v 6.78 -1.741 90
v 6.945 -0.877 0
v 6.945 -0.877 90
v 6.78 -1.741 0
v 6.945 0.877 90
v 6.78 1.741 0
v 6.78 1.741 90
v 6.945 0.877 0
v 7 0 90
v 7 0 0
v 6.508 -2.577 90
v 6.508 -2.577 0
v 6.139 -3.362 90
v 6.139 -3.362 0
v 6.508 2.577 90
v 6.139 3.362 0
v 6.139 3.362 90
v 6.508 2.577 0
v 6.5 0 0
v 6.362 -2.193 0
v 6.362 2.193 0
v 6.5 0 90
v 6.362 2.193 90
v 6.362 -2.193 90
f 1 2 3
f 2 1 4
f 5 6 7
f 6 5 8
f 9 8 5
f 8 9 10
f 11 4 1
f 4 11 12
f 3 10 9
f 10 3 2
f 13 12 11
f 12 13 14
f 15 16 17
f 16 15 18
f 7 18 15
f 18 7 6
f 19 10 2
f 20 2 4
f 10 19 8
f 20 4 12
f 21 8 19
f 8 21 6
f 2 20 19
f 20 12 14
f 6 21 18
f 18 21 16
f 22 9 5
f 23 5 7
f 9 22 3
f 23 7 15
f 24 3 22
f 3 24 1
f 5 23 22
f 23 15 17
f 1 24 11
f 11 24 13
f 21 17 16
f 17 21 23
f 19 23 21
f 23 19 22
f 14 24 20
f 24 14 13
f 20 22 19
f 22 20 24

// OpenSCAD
$fn = 50;


difference() {
	union() {
		cylinder(h = 90, r = 7.0000000000);
		translate(v = [-14.0000000000, 0, 0]) {
			cylinder(h = 90, r = 7.0000000000);
		}
	}
	union() {
		cylinder(h = 90, r = 3.2500000000);
		cylinder(h = 90, r = 1.8000000000);
		cylinder(h = 90, r = 1.8000000000);
		cylinder(h = 90, r = 1.8000000000);
		translate(v = [-18.5000000000, 0, 0]) {
			hull() {
				translate(v = [-3.7500000000, 0.0000000000, 0]) {
					cylinder(h = 90, r = 7.5000000000);
				}
				translate(v = [3.7500000000, 0.0000000000, 0]) {
					cylinder(h = 90, r = 7.5000000000);
				}
				translate(v = [-3.7500000000, -0.0000000000, 0]) {
					cylinder(h = 90, r = 7.5000000000);
				}
				translate(v = [3.7500000000, -0.0000000000, 0]) {
					cylinder(h = 90, r = 7.5000000000);
				}
			}
		}
		translate(v = [-11.0000000000, 0, 0.0000000000]) {
			cylinder(h = 90, r = 17.5000000000);
		}
	}
}
